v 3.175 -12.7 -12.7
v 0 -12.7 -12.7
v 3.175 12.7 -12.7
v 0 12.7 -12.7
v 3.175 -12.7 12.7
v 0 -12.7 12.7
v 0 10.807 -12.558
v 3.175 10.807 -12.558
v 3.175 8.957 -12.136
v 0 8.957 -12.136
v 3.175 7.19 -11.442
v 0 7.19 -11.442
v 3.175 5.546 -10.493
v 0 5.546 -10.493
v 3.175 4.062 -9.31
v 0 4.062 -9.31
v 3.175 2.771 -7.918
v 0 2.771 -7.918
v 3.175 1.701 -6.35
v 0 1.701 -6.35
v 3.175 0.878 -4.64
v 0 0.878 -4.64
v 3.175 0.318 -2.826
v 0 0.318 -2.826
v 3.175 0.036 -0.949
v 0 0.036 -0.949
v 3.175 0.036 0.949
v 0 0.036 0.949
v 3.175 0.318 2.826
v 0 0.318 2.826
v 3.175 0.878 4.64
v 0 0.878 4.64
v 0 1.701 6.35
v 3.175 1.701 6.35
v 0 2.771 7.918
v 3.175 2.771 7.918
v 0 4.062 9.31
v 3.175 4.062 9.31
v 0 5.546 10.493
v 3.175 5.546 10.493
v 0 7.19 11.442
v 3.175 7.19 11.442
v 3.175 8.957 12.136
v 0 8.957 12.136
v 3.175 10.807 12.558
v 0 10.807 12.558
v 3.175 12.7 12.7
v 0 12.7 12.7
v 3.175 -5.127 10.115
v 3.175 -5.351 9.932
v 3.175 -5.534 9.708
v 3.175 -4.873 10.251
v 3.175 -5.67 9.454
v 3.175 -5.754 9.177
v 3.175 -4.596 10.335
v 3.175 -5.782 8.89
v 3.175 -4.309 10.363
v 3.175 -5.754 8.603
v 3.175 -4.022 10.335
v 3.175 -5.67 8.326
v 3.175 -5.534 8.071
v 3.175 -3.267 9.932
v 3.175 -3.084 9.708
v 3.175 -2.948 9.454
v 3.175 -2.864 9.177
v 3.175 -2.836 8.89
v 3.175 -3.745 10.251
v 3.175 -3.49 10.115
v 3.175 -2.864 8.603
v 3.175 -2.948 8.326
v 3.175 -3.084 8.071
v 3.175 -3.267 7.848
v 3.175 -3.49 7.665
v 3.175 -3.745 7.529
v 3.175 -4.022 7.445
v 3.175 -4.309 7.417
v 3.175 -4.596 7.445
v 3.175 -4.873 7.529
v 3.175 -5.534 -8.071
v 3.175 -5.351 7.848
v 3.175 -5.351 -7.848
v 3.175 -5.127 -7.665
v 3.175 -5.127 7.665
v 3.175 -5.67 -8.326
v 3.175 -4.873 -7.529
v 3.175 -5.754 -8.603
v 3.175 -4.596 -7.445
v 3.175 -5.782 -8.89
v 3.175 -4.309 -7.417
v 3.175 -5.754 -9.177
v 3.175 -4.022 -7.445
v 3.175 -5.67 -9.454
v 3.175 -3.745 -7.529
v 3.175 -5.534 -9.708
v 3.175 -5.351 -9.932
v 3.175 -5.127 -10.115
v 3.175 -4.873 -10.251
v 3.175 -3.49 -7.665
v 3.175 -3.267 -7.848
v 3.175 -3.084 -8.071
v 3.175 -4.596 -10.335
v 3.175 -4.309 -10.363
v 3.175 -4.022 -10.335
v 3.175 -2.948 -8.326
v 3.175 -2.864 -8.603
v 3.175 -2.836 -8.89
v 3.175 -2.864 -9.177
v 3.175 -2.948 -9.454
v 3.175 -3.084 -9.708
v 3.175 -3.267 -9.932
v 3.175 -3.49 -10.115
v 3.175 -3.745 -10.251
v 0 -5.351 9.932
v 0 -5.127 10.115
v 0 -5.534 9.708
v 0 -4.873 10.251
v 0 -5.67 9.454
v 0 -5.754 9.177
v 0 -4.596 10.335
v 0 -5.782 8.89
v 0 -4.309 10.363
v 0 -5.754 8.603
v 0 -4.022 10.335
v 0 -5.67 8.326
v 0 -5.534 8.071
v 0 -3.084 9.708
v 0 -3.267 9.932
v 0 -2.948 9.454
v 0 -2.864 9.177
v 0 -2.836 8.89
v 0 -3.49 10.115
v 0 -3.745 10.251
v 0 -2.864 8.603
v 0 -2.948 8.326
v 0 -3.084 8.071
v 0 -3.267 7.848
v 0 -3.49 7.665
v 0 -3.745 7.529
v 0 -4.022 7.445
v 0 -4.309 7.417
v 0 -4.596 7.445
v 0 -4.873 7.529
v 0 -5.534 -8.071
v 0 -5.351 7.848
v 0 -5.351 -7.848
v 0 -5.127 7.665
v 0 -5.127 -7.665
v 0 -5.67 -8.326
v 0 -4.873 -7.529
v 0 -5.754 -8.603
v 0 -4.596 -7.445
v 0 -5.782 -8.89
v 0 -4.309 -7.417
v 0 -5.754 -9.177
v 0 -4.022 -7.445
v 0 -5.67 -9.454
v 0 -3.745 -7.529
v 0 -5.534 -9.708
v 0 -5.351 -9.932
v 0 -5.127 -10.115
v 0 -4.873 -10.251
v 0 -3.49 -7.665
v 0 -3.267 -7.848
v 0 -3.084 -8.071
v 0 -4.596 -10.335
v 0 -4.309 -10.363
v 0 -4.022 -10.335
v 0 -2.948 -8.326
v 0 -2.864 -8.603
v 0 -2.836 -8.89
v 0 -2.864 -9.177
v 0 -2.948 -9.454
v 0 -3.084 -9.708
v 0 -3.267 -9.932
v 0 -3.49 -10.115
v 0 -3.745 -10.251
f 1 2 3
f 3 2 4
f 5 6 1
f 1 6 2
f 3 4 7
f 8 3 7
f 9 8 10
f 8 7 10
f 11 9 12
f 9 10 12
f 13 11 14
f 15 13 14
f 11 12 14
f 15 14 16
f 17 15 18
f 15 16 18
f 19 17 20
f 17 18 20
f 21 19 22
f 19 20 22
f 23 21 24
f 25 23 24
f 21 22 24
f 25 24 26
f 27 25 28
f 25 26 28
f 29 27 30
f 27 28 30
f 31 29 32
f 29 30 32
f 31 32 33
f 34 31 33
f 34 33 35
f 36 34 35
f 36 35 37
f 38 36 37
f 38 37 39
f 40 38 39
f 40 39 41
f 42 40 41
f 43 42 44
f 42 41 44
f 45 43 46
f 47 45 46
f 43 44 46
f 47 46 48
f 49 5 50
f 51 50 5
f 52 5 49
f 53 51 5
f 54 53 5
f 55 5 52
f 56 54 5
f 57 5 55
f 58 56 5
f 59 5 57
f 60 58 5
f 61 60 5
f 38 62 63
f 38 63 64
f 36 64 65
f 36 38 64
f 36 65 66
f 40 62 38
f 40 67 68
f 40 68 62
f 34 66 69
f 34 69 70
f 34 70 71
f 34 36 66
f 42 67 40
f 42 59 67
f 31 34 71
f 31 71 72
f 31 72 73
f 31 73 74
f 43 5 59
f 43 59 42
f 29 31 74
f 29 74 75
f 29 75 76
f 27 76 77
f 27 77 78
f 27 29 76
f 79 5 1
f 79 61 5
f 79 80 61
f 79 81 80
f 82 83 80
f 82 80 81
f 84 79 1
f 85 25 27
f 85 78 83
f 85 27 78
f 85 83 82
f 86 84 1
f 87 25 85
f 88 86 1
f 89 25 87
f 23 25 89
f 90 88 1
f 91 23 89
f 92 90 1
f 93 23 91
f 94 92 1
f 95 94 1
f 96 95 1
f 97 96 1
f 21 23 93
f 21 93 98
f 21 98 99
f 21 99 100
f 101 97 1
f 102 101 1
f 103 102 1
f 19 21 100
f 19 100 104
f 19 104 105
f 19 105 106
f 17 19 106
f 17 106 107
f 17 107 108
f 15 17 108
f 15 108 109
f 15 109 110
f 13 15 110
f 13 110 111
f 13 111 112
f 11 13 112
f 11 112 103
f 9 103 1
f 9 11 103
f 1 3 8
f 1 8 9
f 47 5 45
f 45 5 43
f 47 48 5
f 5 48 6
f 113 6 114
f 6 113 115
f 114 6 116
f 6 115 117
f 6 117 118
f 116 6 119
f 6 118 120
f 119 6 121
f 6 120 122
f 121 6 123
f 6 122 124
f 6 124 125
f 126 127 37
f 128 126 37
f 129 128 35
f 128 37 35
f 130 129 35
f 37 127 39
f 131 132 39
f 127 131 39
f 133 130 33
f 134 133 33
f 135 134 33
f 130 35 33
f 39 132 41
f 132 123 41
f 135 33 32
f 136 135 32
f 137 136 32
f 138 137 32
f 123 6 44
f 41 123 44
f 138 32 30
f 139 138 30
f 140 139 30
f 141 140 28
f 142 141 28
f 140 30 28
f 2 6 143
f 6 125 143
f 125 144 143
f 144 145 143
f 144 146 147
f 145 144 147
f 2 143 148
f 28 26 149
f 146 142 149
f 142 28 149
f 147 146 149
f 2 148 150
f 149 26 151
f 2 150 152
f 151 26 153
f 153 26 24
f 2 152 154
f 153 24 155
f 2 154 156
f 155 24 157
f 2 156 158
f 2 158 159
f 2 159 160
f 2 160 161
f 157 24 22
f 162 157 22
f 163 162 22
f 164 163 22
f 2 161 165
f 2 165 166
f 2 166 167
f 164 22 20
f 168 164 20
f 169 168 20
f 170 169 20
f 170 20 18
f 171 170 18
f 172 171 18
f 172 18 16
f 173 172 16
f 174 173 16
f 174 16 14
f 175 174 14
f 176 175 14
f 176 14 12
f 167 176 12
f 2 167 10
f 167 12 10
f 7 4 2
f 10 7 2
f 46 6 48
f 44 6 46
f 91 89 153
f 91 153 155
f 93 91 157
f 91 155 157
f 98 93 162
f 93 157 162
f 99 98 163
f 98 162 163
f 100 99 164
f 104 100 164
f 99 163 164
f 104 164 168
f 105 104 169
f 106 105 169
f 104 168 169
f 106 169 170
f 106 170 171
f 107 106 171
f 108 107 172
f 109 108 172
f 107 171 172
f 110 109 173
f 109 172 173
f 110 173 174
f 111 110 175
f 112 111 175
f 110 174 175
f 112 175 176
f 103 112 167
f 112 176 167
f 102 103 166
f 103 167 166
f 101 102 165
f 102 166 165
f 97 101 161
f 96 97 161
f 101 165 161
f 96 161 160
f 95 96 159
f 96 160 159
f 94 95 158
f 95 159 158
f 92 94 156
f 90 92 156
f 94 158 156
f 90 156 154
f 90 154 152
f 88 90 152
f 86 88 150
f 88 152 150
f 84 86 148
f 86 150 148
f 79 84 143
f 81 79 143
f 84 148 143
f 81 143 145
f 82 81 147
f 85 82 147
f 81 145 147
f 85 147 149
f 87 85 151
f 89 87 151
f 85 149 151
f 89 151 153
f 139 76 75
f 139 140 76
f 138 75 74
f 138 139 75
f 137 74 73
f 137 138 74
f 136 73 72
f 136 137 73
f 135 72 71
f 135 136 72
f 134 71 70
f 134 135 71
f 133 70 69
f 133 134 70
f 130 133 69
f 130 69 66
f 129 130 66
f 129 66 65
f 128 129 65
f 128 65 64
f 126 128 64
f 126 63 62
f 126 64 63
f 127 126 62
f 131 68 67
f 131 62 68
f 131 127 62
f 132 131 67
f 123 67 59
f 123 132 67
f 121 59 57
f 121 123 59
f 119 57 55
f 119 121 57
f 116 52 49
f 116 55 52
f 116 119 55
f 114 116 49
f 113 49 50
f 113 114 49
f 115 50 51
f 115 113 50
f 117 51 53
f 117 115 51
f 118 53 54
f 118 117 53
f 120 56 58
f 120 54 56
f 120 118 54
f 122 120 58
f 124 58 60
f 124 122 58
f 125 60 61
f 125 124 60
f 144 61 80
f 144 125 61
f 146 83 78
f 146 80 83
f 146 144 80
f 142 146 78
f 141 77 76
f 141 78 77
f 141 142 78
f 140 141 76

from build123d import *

# Parameters (mm, degrees)
BOSS_EXTRUDE1_DEPTH = 3.175
SKETCH6_R           = 1.473196931
CUT_EXTRUDE2_DEPTH  = 19.238986403


with BuildPart() as part:
    # Sketch1 → Boss-Extrude1 (new body)
    with BuildSketch(Plane(origin=(0, 0, 0), x_dir=(0, 0, -1), z_dir=(1, 0, 0))):
        with BuildLine():
            Line((-12.7, -12.7), (12.7, -12.7))
            Line((12.7, -12.7), (12.7, 12.7))
            ThreePointArc((12.7, 12.7), (0, 0), (-12.7, 12.7))
            Line((-12.7, 12.7), (-12.7, -12.7))
        make_face()
    extrude(amount=BOSS_EXTRUDE1_DEPTH)

    # Sketch6 → Cut-Extrude2 (cut, symmetric)
    with BuildSketch(Plane.ZY):
        with Locations((-8.889941847, -4.308950185)):
            Circle(SKETCH6_R)
    cut_extrude2 = extrude(amount=CUT_EXTRUDE2_DEPTH, both=True, mode=Mode.SUBTRACT)

    # Mirror2: Cut-Extrude2 across plane
    add(cut_extrude2.mirror(Plane.XY), mode=Mode.SUBTRACT)


solid = part.part
